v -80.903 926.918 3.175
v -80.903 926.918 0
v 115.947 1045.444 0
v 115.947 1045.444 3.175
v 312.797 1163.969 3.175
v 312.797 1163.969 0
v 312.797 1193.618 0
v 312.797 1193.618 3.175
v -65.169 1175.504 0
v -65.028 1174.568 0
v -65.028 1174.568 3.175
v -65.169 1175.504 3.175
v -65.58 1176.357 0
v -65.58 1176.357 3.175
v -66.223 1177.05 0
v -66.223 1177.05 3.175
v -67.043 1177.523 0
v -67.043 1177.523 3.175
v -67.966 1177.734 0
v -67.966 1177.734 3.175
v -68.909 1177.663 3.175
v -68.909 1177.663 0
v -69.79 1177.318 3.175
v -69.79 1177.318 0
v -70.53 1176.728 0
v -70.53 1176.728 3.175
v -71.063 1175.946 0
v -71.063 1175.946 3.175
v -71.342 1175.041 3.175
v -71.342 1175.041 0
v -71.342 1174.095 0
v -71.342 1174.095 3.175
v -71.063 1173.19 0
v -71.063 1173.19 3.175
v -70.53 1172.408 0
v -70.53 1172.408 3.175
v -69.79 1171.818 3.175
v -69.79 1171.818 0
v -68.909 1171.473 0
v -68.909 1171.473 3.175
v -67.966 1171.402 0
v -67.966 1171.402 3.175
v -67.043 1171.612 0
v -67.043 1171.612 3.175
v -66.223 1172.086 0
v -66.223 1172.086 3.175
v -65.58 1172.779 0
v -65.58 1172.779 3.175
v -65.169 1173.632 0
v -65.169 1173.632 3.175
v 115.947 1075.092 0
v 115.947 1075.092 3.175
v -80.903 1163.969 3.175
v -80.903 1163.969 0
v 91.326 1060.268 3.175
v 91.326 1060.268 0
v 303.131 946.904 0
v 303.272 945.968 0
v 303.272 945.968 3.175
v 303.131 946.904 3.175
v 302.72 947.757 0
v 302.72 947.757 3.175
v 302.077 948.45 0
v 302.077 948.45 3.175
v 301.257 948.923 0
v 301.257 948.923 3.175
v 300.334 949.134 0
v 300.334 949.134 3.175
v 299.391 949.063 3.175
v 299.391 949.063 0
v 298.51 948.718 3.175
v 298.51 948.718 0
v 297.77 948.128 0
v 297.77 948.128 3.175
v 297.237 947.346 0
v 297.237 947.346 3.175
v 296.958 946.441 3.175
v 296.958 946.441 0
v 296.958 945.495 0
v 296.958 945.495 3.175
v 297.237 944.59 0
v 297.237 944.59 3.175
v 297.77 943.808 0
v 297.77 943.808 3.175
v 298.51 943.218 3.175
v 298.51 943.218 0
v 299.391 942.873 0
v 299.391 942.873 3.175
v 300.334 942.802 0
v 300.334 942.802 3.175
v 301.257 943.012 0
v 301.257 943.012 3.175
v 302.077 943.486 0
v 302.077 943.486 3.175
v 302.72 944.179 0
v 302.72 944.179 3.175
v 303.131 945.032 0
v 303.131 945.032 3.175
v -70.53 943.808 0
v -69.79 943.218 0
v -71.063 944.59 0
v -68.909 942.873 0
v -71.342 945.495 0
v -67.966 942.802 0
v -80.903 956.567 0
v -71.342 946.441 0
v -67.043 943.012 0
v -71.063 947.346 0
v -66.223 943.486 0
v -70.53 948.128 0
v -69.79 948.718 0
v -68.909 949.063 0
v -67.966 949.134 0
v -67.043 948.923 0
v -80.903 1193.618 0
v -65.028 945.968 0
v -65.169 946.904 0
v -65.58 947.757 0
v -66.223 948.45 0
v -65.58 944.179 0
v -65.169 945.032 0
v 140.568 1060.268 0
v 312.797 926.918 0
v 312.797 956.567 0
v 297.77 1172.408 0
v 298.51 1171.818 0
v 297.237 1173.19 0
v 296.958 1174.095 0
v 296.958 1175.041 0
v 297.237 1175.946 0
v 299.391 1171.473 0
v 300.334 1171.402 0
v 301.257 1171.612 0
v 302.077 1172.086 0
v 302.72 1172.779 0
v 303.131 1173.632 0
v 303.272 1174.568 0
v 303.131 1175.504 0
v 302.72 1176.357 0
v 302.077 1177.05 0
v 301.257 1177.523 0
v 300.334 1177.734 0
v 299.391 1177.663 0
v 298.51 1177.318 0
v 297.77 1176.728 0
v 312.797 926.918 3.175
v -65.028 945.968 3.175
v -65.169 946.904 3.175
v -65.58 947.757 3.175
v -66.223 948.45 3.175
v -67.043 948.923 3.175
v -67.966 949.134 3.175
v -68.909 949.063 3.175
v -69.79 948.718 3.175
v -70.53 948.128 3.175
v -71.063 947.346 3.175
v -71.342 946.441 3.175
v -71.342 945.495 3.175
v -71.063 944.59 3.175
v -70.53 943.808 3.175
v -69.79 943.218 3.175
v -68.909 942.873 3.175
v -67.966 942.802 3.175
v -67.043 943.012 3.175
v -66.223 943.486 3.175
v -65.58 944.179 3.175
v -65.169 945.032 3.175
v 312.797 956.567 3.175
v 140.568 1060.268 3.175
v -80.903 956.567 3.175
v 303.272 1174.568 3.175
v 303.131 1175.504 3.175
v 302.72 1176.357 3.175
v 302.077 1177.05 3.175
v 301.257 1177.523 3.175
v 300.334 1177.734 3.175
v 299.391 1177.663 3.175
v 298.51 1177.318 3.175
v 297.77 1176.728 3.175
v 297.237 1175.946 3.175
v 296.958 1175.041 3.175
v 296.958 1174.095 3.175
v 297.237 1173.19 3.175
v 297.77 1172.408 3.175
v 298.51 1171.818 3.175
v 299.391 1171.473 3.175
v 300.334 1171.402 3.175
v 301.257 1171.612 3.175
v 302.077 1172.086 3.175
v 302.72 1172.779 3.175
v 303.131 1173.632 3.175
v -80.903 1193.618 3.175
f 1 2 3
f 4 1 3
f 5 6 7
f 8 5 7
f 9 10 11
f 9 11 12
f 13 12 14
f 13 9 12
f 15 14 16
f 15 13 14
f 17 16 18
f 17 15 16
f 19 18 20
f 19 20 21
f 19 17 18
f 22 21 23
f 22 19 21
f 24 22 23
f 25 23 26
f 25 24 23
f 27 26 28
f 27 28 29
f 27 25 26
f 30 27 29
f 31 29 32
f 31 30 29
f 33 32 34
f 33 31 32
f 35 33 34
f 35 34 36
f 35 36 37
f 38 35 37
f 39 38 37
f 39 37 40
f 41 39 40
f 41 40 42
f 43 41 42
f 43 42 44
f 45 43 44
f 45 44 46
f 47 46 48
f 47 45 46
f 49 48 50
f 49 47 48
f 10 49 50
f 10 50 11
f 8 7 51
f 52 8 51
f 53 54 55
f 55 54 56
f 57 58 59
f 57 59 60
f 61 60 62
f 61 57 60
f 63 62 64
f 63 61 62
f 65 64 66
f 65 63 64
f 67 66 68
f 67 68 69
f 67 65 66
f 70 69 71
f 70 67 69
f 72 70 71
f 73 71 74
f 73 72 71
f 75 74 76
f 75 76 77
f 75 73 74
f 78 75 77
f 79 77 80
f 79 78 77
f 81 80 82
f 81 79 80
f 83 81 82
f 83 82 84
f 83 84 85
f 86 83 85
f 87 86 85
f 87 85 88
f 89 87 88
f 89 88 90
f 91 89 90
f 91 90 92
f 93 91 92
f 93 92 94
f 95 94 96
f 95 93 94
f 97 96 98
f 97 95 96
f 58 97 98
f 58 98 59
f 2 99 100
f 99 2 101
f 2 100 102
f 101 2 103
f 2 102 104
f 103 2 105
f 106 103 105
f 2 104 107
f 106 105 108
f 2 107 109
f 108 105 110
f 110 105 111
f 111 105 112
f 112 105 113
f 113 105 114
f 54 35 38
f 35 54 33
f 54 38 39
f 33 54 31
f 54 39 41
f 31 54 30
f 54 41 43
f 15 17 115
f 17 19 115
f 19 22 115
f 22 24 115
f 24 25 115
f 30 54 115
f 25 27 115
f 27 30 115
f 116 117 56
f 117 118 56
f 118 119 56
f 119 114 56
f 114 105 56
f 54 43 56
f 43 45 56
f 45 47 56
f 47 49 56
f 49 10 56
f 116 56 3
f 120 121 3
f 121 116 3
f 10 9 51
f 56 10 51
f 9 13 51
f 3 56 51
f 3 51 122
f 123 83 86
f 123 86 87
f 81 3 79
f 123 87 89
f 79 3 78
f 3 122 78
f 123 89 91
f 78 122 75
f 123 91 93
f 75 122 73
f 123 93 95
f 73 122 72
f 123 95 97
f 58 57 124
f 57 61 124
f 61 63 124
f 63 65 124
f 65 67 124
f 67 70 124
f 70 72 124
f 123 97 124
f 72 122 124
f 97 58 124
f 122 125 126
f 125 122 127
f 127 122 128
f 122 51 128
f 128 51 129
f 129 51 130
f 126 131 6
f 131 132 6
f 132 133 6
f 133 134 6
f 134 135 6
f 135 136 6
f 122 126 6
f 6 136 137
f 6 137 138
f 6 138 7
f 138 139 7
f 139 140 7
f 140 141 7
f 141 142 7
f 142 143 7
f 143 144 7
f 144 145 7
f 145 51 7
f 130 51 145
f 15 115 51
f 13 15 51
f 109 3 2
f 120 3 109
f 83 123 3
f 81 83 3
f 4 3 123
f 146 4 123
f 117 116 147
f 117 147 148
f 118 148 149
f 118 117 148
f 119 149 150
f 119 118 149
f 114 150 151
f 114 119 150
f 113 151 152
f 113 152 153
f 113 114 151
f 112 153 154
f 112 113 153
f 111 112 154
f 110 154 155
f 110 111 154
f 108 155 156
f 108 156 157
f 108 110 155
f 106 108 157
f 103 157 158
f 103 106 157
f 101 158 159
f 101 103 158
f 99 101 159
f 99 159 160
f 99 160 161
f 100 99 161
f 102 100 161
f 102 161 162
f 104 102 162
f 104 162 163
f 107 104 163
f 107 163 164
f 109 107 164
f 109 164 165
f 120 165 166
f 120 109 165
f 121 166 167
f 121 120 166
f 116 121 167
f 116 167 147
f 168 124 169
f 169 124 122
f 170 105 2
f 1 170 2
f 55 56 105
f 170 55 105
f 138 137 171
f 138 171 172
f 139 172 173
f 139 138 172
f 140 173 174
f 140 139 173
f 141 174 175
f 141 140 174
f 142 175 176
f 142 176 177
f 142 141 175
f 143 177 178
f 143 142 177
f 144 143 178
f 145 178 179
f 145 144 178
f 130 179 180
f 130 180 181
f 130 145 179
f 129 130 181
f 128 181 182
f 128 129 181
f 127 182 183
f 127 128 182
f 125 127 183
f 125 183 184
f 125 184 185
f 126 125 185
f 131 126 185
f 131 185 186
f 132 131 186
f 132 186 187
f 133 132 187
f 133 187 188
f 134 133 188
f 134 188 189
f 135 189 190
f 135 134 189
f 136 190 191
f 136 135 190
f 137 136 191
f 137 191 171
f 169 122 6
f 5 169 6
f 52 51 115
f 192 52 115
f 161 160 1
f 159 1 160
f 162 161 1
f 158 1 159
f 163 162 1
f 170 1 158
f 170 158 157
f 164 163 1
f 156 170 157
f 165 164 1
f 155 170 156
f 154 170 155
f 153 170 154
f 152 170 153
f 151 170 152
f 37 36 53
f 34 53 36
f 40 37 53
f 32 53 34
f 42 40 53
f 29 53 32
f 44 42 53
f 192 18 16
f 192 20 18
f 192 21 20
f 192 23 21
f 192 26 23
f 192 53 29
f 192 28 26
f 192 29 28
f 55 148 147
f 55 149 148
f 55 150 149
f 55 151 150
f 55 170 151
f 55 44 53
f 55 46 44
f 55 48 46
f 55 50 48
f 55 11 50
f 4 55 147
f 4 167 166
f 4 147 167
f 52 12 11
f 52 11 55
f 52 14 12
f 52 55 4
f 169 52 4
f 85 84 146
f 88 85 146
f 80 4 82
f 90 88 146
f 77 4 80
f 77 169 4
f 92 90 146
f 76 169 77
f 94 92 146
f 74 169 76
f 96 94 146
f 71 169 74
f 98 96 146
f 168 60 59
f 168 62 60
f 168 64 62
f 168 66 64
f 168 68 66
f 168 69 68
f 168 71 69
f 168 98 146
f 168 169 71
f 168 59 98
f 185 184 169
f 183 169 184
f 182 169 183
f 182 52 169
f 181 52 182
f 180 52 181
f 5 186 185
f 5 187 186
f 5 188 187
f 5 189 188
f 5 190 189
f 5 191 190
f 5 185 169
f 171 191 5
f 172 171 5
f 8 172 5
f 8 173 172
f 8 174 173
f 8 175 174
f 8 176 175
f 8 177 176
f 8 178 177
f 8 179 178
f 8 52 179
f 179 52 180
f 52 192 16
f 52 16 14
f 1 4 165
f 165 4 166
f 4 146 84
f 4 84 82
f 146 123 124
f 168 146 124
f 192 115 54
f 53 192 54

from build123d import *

# Parameters (mm, degrees)
F0_R     = 3.175
F1_DEPTH = 3.175


with BuildPart() as f1:
    # F0 (on Top) → F1 (new body)
    with BuildSketch(Plane.XY):
        Polygon((140.5679399306, 1060.2679701805), (115.9471851349, 1045.4435404041), (312.7971851349, 926.9179701805), (312.7971851349, 956.5668297334), align=None)
        with Locations((300.0971851349, 945.9679701805)):
            Circle(F0_R, mode=Mode.SUBTRACT)
        Polygon((115.9471851349, 1075.092399957), (140.5679399306, 1060.2679701805), (312.7971851349, 1163.9691106276), (312.7971851349, 1193.6179701805), align=None)
        with Locations((300.0971851349, 1174.5679701805)):
            Circle(F0_R, mode=Mode.SUBTRACT)
        Polygon((-80.9028148651, 956.5668297334), (-80.9028148651, 926.9179701805), (115.9471851349, 1045.4435404041), (91.3264303392, 1060.2679701805), align=None)
        with Locations((-68.2028148651, 945.9679701805)):
            Circle(F0_R, mode=Mode.SUBTRACT)
        Polygon((-80.9028148651, 1193.6179701805), (-80.9028148651, 1163.9691106276), (91.3264303392, 1060.2679701805), (115.9471851349, 1075.092399957), align=None)
        with Locations((-68.2028148651, 1174.5679701805)):
            Circle(F0_R, mode=Mode.SUBTRACT)
        Polygon((91.3264303392, 1060.2679701805), (115.9471851349, 1045.4435404041), (140.5679399306, 1060.2679701805), (115.9471851349, 1075.092399957), align=None)
    extrude(amount=F1_DEPTH)


solid = f1.part
